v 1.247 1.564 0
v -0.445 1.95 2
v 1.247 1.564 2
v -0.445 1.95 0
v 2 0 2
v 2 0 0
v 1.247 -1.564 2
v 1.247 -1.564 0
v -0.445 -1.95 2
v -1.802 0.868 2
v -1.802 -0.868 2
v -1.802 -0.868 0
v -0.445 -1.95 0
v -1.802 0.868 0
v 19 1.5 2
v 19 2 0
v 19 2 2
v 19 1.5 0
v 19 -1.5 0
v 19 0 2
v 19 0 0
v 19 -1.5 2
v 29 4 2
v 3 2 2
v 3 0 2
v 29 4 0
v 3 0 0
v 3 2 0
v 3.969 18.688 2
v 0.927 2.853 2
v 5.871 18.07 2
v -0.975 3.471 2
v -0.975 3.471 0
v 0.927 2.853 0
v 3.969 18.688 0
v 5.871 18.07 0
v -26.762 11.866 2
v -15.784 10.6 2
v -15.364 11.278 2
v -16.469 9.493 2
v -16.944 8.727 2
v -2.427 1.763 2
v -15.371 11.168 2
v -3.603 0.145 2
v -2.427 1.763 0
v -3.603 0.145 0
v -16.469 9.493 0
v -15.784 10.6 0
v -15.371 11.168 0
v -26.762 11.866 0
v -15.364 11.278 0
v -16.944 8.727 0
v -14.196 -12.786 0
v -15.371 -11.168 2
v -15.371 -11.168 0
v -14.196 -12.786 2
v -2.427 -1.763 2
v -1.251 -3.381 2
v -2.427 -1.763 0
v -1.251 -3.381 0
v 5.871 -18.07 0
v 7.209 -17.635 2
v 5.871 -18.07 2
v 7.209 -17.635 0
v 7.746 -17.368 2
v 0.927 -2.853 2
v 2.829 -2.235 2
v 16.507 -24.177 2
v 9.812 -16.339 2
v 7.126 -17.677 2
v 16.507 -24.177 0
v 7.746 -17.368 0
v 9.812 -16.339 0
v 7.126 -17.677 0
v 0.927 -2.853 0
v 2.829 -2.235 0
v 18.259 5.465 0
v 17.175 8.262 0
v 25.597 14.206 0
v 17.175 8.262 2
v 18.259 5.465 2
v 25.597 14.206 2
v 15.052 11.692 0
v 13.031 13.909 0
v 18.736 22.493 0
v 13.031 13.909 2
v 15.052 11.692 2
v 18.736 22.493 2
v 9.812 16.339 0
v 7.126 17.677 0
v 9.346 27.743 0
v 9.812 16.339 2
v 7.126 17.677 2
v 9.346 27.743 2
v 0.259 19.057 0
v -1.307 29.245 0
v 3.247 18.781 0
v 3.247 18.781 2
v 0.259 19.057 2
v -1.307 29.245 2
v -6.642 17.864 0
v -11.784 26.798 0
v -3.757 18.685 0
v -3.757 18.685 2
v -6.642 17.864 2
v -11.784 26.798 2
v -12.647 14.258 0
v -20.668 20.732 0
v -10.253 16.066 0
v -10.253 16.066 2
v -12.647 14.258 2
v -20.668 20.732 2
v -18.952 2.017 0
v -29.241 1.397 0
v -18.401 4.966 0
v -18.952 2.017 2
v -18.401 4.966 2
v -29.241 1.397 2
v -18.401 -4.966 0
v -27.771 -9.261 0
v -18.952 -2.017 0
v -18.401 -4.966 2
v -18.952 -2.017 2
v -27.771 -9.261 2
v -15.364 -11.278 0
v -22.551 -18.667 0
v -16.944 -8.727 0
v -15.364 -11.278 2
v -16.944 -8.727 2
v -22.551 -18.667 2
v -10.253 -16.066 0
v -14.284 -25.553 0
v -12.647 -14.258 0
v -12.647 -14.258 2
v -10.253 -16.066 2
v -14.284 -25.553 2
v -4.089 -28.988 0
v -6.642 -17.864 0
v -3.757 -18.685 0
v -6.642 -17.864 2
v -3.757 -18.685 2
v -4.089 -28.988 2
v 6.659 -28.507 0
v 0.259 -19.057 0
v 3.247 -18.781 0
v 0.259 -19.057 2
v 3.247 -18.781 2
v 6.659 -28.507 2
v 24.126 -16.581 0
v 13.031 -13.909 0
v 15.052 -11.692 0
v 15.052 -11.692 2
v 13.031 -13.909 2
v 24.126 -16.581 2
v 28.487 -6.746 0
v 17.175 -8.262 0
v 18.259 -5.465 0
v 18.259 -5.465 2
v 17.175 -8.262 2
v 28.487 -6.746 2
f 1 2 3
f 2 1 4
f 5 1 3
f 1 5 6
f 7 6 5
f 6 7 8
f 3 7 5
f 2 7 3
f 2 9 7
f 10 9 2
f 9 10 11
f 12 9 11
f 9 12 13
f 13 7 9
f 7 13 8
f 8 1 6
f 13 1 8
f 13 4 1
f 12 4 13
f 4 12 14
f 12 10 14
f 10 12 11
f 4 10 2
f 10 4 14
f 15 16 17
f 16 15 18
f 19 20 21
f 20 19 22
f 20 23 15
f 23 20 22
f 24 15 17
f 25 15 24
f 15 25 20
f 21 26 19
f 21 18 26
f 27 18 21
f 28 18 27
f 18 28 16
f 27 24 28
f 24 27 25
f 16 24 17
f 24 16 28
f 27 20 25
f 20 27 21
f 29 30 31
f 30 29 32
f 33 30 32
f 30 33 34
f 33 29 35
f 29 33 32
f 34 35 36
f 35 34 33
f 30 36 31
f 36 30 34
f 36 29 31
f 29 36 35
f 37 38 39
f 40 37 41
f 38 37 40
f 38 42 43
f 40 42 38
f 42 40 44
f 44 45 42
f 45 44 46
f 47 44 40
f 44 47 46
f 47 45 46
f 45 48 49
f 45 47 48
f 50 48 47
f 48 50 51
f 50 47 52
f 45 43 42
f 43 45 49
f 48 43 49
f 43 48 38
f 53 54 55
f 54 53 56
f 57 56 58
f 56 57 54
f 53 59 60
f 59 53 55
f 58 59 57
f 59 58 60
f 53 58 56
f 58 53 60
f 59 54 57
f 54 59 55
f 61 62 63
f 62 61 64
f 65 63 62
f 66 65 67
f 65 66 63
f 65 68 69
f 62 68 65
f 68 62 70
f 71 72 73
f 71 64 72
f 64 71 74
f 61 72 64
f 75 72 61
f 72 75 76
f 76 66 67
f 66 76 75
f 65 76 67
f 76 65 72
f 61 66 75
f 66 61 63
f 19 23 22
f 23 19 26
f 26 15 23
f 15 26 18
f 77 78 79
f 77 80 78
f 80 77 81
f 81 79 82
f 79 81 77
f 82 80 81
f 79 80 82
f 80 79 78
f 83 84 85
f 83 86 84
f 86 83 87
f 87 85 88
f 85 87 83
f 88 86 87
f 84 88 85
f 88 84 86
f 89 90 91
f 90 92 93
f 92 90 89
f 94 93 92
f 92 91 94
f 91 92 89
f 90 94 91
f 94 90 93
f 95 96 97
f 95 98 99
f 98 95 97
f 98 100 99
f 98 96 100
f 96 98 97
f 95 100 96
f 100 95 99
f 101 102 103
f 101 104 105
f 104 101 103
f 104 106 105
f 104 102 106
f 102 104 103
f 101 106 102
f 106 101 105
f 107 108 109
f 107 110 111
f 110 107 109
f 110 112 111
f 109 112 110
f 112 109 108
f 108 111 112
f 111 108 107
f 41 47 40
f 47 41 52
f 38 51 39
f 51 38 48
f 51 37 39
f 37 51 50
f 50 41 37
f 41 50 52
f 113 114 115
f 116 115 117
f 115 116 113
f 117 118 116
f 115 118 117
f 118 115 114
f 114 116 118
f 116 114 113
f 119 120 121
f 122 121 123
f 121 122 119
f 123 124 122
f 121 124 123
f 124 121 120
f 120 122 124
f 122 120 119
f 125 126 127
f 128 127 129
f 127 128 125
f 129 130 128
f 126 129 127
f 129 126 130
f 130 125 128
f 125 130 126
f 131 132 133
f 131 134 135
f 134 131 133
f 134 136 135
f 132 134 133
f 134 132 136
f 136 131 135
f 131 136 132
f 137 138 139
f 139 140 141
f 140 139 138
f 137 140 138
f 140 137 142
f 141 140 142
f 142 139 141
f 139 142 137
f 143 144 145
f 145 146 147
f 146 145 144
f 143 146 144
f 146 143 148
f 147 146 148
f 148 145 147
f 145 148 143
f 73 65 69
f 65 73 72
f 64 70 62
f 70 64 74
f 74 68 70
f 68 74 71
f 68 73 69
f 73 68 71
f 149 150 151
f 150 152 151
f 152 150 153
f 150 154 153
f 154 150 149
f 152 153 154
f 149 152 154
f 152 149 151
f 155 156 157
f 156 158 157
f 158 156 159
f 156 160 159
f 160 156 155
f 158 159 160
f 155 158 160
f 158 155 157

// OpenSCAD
// PREFERENCES
WHEEL_HEIGHT=2;

// Ring
module Ring(radius, thickness, height=WHEEL_HEIGHT) {
    difference() {
        cylinder(height, r=radius);
        cylinder(height, r=radius-thickness);
    }
}

// Escapement wheel
module EscapementWheelCog(lenght=10,crook=5,thickness=3,height=WHEEL_HEIGHT) {
    linear_extrude(height) {
        polygon([
            [0,-thickness/2],
            [0,thickness/2],
            [lenght,crook]
         ]);
    }
}

module EscapementWheel(radius, cog_count, height=WHEEL_HEIGHT) {
    union() {
        Ring(height, radius, radius/10);
        Ring(height, radius/5, radius/10);
        
        for (i = [0:360/5:360]) {
           rotate([0, 0, i]) {
              translate([radius*0.15, 0, 0]) {
                cube([radius * 0.80, radius/10, height]);
              }
           }
        }
        
        for (i = [0:360/cog_count:360]) {
            rotate([0, 0, i]) {
                translate([radius*0.95, 0, 0]) {
                    EscapementWheelCog(radius*0.5, radius*0.2, radius*0.15);
                }
            }
        }
    }
}

// Escapement lock
module EscapementLock(width) {
    
}


// Demo
EscapementWheel(20, 17);
